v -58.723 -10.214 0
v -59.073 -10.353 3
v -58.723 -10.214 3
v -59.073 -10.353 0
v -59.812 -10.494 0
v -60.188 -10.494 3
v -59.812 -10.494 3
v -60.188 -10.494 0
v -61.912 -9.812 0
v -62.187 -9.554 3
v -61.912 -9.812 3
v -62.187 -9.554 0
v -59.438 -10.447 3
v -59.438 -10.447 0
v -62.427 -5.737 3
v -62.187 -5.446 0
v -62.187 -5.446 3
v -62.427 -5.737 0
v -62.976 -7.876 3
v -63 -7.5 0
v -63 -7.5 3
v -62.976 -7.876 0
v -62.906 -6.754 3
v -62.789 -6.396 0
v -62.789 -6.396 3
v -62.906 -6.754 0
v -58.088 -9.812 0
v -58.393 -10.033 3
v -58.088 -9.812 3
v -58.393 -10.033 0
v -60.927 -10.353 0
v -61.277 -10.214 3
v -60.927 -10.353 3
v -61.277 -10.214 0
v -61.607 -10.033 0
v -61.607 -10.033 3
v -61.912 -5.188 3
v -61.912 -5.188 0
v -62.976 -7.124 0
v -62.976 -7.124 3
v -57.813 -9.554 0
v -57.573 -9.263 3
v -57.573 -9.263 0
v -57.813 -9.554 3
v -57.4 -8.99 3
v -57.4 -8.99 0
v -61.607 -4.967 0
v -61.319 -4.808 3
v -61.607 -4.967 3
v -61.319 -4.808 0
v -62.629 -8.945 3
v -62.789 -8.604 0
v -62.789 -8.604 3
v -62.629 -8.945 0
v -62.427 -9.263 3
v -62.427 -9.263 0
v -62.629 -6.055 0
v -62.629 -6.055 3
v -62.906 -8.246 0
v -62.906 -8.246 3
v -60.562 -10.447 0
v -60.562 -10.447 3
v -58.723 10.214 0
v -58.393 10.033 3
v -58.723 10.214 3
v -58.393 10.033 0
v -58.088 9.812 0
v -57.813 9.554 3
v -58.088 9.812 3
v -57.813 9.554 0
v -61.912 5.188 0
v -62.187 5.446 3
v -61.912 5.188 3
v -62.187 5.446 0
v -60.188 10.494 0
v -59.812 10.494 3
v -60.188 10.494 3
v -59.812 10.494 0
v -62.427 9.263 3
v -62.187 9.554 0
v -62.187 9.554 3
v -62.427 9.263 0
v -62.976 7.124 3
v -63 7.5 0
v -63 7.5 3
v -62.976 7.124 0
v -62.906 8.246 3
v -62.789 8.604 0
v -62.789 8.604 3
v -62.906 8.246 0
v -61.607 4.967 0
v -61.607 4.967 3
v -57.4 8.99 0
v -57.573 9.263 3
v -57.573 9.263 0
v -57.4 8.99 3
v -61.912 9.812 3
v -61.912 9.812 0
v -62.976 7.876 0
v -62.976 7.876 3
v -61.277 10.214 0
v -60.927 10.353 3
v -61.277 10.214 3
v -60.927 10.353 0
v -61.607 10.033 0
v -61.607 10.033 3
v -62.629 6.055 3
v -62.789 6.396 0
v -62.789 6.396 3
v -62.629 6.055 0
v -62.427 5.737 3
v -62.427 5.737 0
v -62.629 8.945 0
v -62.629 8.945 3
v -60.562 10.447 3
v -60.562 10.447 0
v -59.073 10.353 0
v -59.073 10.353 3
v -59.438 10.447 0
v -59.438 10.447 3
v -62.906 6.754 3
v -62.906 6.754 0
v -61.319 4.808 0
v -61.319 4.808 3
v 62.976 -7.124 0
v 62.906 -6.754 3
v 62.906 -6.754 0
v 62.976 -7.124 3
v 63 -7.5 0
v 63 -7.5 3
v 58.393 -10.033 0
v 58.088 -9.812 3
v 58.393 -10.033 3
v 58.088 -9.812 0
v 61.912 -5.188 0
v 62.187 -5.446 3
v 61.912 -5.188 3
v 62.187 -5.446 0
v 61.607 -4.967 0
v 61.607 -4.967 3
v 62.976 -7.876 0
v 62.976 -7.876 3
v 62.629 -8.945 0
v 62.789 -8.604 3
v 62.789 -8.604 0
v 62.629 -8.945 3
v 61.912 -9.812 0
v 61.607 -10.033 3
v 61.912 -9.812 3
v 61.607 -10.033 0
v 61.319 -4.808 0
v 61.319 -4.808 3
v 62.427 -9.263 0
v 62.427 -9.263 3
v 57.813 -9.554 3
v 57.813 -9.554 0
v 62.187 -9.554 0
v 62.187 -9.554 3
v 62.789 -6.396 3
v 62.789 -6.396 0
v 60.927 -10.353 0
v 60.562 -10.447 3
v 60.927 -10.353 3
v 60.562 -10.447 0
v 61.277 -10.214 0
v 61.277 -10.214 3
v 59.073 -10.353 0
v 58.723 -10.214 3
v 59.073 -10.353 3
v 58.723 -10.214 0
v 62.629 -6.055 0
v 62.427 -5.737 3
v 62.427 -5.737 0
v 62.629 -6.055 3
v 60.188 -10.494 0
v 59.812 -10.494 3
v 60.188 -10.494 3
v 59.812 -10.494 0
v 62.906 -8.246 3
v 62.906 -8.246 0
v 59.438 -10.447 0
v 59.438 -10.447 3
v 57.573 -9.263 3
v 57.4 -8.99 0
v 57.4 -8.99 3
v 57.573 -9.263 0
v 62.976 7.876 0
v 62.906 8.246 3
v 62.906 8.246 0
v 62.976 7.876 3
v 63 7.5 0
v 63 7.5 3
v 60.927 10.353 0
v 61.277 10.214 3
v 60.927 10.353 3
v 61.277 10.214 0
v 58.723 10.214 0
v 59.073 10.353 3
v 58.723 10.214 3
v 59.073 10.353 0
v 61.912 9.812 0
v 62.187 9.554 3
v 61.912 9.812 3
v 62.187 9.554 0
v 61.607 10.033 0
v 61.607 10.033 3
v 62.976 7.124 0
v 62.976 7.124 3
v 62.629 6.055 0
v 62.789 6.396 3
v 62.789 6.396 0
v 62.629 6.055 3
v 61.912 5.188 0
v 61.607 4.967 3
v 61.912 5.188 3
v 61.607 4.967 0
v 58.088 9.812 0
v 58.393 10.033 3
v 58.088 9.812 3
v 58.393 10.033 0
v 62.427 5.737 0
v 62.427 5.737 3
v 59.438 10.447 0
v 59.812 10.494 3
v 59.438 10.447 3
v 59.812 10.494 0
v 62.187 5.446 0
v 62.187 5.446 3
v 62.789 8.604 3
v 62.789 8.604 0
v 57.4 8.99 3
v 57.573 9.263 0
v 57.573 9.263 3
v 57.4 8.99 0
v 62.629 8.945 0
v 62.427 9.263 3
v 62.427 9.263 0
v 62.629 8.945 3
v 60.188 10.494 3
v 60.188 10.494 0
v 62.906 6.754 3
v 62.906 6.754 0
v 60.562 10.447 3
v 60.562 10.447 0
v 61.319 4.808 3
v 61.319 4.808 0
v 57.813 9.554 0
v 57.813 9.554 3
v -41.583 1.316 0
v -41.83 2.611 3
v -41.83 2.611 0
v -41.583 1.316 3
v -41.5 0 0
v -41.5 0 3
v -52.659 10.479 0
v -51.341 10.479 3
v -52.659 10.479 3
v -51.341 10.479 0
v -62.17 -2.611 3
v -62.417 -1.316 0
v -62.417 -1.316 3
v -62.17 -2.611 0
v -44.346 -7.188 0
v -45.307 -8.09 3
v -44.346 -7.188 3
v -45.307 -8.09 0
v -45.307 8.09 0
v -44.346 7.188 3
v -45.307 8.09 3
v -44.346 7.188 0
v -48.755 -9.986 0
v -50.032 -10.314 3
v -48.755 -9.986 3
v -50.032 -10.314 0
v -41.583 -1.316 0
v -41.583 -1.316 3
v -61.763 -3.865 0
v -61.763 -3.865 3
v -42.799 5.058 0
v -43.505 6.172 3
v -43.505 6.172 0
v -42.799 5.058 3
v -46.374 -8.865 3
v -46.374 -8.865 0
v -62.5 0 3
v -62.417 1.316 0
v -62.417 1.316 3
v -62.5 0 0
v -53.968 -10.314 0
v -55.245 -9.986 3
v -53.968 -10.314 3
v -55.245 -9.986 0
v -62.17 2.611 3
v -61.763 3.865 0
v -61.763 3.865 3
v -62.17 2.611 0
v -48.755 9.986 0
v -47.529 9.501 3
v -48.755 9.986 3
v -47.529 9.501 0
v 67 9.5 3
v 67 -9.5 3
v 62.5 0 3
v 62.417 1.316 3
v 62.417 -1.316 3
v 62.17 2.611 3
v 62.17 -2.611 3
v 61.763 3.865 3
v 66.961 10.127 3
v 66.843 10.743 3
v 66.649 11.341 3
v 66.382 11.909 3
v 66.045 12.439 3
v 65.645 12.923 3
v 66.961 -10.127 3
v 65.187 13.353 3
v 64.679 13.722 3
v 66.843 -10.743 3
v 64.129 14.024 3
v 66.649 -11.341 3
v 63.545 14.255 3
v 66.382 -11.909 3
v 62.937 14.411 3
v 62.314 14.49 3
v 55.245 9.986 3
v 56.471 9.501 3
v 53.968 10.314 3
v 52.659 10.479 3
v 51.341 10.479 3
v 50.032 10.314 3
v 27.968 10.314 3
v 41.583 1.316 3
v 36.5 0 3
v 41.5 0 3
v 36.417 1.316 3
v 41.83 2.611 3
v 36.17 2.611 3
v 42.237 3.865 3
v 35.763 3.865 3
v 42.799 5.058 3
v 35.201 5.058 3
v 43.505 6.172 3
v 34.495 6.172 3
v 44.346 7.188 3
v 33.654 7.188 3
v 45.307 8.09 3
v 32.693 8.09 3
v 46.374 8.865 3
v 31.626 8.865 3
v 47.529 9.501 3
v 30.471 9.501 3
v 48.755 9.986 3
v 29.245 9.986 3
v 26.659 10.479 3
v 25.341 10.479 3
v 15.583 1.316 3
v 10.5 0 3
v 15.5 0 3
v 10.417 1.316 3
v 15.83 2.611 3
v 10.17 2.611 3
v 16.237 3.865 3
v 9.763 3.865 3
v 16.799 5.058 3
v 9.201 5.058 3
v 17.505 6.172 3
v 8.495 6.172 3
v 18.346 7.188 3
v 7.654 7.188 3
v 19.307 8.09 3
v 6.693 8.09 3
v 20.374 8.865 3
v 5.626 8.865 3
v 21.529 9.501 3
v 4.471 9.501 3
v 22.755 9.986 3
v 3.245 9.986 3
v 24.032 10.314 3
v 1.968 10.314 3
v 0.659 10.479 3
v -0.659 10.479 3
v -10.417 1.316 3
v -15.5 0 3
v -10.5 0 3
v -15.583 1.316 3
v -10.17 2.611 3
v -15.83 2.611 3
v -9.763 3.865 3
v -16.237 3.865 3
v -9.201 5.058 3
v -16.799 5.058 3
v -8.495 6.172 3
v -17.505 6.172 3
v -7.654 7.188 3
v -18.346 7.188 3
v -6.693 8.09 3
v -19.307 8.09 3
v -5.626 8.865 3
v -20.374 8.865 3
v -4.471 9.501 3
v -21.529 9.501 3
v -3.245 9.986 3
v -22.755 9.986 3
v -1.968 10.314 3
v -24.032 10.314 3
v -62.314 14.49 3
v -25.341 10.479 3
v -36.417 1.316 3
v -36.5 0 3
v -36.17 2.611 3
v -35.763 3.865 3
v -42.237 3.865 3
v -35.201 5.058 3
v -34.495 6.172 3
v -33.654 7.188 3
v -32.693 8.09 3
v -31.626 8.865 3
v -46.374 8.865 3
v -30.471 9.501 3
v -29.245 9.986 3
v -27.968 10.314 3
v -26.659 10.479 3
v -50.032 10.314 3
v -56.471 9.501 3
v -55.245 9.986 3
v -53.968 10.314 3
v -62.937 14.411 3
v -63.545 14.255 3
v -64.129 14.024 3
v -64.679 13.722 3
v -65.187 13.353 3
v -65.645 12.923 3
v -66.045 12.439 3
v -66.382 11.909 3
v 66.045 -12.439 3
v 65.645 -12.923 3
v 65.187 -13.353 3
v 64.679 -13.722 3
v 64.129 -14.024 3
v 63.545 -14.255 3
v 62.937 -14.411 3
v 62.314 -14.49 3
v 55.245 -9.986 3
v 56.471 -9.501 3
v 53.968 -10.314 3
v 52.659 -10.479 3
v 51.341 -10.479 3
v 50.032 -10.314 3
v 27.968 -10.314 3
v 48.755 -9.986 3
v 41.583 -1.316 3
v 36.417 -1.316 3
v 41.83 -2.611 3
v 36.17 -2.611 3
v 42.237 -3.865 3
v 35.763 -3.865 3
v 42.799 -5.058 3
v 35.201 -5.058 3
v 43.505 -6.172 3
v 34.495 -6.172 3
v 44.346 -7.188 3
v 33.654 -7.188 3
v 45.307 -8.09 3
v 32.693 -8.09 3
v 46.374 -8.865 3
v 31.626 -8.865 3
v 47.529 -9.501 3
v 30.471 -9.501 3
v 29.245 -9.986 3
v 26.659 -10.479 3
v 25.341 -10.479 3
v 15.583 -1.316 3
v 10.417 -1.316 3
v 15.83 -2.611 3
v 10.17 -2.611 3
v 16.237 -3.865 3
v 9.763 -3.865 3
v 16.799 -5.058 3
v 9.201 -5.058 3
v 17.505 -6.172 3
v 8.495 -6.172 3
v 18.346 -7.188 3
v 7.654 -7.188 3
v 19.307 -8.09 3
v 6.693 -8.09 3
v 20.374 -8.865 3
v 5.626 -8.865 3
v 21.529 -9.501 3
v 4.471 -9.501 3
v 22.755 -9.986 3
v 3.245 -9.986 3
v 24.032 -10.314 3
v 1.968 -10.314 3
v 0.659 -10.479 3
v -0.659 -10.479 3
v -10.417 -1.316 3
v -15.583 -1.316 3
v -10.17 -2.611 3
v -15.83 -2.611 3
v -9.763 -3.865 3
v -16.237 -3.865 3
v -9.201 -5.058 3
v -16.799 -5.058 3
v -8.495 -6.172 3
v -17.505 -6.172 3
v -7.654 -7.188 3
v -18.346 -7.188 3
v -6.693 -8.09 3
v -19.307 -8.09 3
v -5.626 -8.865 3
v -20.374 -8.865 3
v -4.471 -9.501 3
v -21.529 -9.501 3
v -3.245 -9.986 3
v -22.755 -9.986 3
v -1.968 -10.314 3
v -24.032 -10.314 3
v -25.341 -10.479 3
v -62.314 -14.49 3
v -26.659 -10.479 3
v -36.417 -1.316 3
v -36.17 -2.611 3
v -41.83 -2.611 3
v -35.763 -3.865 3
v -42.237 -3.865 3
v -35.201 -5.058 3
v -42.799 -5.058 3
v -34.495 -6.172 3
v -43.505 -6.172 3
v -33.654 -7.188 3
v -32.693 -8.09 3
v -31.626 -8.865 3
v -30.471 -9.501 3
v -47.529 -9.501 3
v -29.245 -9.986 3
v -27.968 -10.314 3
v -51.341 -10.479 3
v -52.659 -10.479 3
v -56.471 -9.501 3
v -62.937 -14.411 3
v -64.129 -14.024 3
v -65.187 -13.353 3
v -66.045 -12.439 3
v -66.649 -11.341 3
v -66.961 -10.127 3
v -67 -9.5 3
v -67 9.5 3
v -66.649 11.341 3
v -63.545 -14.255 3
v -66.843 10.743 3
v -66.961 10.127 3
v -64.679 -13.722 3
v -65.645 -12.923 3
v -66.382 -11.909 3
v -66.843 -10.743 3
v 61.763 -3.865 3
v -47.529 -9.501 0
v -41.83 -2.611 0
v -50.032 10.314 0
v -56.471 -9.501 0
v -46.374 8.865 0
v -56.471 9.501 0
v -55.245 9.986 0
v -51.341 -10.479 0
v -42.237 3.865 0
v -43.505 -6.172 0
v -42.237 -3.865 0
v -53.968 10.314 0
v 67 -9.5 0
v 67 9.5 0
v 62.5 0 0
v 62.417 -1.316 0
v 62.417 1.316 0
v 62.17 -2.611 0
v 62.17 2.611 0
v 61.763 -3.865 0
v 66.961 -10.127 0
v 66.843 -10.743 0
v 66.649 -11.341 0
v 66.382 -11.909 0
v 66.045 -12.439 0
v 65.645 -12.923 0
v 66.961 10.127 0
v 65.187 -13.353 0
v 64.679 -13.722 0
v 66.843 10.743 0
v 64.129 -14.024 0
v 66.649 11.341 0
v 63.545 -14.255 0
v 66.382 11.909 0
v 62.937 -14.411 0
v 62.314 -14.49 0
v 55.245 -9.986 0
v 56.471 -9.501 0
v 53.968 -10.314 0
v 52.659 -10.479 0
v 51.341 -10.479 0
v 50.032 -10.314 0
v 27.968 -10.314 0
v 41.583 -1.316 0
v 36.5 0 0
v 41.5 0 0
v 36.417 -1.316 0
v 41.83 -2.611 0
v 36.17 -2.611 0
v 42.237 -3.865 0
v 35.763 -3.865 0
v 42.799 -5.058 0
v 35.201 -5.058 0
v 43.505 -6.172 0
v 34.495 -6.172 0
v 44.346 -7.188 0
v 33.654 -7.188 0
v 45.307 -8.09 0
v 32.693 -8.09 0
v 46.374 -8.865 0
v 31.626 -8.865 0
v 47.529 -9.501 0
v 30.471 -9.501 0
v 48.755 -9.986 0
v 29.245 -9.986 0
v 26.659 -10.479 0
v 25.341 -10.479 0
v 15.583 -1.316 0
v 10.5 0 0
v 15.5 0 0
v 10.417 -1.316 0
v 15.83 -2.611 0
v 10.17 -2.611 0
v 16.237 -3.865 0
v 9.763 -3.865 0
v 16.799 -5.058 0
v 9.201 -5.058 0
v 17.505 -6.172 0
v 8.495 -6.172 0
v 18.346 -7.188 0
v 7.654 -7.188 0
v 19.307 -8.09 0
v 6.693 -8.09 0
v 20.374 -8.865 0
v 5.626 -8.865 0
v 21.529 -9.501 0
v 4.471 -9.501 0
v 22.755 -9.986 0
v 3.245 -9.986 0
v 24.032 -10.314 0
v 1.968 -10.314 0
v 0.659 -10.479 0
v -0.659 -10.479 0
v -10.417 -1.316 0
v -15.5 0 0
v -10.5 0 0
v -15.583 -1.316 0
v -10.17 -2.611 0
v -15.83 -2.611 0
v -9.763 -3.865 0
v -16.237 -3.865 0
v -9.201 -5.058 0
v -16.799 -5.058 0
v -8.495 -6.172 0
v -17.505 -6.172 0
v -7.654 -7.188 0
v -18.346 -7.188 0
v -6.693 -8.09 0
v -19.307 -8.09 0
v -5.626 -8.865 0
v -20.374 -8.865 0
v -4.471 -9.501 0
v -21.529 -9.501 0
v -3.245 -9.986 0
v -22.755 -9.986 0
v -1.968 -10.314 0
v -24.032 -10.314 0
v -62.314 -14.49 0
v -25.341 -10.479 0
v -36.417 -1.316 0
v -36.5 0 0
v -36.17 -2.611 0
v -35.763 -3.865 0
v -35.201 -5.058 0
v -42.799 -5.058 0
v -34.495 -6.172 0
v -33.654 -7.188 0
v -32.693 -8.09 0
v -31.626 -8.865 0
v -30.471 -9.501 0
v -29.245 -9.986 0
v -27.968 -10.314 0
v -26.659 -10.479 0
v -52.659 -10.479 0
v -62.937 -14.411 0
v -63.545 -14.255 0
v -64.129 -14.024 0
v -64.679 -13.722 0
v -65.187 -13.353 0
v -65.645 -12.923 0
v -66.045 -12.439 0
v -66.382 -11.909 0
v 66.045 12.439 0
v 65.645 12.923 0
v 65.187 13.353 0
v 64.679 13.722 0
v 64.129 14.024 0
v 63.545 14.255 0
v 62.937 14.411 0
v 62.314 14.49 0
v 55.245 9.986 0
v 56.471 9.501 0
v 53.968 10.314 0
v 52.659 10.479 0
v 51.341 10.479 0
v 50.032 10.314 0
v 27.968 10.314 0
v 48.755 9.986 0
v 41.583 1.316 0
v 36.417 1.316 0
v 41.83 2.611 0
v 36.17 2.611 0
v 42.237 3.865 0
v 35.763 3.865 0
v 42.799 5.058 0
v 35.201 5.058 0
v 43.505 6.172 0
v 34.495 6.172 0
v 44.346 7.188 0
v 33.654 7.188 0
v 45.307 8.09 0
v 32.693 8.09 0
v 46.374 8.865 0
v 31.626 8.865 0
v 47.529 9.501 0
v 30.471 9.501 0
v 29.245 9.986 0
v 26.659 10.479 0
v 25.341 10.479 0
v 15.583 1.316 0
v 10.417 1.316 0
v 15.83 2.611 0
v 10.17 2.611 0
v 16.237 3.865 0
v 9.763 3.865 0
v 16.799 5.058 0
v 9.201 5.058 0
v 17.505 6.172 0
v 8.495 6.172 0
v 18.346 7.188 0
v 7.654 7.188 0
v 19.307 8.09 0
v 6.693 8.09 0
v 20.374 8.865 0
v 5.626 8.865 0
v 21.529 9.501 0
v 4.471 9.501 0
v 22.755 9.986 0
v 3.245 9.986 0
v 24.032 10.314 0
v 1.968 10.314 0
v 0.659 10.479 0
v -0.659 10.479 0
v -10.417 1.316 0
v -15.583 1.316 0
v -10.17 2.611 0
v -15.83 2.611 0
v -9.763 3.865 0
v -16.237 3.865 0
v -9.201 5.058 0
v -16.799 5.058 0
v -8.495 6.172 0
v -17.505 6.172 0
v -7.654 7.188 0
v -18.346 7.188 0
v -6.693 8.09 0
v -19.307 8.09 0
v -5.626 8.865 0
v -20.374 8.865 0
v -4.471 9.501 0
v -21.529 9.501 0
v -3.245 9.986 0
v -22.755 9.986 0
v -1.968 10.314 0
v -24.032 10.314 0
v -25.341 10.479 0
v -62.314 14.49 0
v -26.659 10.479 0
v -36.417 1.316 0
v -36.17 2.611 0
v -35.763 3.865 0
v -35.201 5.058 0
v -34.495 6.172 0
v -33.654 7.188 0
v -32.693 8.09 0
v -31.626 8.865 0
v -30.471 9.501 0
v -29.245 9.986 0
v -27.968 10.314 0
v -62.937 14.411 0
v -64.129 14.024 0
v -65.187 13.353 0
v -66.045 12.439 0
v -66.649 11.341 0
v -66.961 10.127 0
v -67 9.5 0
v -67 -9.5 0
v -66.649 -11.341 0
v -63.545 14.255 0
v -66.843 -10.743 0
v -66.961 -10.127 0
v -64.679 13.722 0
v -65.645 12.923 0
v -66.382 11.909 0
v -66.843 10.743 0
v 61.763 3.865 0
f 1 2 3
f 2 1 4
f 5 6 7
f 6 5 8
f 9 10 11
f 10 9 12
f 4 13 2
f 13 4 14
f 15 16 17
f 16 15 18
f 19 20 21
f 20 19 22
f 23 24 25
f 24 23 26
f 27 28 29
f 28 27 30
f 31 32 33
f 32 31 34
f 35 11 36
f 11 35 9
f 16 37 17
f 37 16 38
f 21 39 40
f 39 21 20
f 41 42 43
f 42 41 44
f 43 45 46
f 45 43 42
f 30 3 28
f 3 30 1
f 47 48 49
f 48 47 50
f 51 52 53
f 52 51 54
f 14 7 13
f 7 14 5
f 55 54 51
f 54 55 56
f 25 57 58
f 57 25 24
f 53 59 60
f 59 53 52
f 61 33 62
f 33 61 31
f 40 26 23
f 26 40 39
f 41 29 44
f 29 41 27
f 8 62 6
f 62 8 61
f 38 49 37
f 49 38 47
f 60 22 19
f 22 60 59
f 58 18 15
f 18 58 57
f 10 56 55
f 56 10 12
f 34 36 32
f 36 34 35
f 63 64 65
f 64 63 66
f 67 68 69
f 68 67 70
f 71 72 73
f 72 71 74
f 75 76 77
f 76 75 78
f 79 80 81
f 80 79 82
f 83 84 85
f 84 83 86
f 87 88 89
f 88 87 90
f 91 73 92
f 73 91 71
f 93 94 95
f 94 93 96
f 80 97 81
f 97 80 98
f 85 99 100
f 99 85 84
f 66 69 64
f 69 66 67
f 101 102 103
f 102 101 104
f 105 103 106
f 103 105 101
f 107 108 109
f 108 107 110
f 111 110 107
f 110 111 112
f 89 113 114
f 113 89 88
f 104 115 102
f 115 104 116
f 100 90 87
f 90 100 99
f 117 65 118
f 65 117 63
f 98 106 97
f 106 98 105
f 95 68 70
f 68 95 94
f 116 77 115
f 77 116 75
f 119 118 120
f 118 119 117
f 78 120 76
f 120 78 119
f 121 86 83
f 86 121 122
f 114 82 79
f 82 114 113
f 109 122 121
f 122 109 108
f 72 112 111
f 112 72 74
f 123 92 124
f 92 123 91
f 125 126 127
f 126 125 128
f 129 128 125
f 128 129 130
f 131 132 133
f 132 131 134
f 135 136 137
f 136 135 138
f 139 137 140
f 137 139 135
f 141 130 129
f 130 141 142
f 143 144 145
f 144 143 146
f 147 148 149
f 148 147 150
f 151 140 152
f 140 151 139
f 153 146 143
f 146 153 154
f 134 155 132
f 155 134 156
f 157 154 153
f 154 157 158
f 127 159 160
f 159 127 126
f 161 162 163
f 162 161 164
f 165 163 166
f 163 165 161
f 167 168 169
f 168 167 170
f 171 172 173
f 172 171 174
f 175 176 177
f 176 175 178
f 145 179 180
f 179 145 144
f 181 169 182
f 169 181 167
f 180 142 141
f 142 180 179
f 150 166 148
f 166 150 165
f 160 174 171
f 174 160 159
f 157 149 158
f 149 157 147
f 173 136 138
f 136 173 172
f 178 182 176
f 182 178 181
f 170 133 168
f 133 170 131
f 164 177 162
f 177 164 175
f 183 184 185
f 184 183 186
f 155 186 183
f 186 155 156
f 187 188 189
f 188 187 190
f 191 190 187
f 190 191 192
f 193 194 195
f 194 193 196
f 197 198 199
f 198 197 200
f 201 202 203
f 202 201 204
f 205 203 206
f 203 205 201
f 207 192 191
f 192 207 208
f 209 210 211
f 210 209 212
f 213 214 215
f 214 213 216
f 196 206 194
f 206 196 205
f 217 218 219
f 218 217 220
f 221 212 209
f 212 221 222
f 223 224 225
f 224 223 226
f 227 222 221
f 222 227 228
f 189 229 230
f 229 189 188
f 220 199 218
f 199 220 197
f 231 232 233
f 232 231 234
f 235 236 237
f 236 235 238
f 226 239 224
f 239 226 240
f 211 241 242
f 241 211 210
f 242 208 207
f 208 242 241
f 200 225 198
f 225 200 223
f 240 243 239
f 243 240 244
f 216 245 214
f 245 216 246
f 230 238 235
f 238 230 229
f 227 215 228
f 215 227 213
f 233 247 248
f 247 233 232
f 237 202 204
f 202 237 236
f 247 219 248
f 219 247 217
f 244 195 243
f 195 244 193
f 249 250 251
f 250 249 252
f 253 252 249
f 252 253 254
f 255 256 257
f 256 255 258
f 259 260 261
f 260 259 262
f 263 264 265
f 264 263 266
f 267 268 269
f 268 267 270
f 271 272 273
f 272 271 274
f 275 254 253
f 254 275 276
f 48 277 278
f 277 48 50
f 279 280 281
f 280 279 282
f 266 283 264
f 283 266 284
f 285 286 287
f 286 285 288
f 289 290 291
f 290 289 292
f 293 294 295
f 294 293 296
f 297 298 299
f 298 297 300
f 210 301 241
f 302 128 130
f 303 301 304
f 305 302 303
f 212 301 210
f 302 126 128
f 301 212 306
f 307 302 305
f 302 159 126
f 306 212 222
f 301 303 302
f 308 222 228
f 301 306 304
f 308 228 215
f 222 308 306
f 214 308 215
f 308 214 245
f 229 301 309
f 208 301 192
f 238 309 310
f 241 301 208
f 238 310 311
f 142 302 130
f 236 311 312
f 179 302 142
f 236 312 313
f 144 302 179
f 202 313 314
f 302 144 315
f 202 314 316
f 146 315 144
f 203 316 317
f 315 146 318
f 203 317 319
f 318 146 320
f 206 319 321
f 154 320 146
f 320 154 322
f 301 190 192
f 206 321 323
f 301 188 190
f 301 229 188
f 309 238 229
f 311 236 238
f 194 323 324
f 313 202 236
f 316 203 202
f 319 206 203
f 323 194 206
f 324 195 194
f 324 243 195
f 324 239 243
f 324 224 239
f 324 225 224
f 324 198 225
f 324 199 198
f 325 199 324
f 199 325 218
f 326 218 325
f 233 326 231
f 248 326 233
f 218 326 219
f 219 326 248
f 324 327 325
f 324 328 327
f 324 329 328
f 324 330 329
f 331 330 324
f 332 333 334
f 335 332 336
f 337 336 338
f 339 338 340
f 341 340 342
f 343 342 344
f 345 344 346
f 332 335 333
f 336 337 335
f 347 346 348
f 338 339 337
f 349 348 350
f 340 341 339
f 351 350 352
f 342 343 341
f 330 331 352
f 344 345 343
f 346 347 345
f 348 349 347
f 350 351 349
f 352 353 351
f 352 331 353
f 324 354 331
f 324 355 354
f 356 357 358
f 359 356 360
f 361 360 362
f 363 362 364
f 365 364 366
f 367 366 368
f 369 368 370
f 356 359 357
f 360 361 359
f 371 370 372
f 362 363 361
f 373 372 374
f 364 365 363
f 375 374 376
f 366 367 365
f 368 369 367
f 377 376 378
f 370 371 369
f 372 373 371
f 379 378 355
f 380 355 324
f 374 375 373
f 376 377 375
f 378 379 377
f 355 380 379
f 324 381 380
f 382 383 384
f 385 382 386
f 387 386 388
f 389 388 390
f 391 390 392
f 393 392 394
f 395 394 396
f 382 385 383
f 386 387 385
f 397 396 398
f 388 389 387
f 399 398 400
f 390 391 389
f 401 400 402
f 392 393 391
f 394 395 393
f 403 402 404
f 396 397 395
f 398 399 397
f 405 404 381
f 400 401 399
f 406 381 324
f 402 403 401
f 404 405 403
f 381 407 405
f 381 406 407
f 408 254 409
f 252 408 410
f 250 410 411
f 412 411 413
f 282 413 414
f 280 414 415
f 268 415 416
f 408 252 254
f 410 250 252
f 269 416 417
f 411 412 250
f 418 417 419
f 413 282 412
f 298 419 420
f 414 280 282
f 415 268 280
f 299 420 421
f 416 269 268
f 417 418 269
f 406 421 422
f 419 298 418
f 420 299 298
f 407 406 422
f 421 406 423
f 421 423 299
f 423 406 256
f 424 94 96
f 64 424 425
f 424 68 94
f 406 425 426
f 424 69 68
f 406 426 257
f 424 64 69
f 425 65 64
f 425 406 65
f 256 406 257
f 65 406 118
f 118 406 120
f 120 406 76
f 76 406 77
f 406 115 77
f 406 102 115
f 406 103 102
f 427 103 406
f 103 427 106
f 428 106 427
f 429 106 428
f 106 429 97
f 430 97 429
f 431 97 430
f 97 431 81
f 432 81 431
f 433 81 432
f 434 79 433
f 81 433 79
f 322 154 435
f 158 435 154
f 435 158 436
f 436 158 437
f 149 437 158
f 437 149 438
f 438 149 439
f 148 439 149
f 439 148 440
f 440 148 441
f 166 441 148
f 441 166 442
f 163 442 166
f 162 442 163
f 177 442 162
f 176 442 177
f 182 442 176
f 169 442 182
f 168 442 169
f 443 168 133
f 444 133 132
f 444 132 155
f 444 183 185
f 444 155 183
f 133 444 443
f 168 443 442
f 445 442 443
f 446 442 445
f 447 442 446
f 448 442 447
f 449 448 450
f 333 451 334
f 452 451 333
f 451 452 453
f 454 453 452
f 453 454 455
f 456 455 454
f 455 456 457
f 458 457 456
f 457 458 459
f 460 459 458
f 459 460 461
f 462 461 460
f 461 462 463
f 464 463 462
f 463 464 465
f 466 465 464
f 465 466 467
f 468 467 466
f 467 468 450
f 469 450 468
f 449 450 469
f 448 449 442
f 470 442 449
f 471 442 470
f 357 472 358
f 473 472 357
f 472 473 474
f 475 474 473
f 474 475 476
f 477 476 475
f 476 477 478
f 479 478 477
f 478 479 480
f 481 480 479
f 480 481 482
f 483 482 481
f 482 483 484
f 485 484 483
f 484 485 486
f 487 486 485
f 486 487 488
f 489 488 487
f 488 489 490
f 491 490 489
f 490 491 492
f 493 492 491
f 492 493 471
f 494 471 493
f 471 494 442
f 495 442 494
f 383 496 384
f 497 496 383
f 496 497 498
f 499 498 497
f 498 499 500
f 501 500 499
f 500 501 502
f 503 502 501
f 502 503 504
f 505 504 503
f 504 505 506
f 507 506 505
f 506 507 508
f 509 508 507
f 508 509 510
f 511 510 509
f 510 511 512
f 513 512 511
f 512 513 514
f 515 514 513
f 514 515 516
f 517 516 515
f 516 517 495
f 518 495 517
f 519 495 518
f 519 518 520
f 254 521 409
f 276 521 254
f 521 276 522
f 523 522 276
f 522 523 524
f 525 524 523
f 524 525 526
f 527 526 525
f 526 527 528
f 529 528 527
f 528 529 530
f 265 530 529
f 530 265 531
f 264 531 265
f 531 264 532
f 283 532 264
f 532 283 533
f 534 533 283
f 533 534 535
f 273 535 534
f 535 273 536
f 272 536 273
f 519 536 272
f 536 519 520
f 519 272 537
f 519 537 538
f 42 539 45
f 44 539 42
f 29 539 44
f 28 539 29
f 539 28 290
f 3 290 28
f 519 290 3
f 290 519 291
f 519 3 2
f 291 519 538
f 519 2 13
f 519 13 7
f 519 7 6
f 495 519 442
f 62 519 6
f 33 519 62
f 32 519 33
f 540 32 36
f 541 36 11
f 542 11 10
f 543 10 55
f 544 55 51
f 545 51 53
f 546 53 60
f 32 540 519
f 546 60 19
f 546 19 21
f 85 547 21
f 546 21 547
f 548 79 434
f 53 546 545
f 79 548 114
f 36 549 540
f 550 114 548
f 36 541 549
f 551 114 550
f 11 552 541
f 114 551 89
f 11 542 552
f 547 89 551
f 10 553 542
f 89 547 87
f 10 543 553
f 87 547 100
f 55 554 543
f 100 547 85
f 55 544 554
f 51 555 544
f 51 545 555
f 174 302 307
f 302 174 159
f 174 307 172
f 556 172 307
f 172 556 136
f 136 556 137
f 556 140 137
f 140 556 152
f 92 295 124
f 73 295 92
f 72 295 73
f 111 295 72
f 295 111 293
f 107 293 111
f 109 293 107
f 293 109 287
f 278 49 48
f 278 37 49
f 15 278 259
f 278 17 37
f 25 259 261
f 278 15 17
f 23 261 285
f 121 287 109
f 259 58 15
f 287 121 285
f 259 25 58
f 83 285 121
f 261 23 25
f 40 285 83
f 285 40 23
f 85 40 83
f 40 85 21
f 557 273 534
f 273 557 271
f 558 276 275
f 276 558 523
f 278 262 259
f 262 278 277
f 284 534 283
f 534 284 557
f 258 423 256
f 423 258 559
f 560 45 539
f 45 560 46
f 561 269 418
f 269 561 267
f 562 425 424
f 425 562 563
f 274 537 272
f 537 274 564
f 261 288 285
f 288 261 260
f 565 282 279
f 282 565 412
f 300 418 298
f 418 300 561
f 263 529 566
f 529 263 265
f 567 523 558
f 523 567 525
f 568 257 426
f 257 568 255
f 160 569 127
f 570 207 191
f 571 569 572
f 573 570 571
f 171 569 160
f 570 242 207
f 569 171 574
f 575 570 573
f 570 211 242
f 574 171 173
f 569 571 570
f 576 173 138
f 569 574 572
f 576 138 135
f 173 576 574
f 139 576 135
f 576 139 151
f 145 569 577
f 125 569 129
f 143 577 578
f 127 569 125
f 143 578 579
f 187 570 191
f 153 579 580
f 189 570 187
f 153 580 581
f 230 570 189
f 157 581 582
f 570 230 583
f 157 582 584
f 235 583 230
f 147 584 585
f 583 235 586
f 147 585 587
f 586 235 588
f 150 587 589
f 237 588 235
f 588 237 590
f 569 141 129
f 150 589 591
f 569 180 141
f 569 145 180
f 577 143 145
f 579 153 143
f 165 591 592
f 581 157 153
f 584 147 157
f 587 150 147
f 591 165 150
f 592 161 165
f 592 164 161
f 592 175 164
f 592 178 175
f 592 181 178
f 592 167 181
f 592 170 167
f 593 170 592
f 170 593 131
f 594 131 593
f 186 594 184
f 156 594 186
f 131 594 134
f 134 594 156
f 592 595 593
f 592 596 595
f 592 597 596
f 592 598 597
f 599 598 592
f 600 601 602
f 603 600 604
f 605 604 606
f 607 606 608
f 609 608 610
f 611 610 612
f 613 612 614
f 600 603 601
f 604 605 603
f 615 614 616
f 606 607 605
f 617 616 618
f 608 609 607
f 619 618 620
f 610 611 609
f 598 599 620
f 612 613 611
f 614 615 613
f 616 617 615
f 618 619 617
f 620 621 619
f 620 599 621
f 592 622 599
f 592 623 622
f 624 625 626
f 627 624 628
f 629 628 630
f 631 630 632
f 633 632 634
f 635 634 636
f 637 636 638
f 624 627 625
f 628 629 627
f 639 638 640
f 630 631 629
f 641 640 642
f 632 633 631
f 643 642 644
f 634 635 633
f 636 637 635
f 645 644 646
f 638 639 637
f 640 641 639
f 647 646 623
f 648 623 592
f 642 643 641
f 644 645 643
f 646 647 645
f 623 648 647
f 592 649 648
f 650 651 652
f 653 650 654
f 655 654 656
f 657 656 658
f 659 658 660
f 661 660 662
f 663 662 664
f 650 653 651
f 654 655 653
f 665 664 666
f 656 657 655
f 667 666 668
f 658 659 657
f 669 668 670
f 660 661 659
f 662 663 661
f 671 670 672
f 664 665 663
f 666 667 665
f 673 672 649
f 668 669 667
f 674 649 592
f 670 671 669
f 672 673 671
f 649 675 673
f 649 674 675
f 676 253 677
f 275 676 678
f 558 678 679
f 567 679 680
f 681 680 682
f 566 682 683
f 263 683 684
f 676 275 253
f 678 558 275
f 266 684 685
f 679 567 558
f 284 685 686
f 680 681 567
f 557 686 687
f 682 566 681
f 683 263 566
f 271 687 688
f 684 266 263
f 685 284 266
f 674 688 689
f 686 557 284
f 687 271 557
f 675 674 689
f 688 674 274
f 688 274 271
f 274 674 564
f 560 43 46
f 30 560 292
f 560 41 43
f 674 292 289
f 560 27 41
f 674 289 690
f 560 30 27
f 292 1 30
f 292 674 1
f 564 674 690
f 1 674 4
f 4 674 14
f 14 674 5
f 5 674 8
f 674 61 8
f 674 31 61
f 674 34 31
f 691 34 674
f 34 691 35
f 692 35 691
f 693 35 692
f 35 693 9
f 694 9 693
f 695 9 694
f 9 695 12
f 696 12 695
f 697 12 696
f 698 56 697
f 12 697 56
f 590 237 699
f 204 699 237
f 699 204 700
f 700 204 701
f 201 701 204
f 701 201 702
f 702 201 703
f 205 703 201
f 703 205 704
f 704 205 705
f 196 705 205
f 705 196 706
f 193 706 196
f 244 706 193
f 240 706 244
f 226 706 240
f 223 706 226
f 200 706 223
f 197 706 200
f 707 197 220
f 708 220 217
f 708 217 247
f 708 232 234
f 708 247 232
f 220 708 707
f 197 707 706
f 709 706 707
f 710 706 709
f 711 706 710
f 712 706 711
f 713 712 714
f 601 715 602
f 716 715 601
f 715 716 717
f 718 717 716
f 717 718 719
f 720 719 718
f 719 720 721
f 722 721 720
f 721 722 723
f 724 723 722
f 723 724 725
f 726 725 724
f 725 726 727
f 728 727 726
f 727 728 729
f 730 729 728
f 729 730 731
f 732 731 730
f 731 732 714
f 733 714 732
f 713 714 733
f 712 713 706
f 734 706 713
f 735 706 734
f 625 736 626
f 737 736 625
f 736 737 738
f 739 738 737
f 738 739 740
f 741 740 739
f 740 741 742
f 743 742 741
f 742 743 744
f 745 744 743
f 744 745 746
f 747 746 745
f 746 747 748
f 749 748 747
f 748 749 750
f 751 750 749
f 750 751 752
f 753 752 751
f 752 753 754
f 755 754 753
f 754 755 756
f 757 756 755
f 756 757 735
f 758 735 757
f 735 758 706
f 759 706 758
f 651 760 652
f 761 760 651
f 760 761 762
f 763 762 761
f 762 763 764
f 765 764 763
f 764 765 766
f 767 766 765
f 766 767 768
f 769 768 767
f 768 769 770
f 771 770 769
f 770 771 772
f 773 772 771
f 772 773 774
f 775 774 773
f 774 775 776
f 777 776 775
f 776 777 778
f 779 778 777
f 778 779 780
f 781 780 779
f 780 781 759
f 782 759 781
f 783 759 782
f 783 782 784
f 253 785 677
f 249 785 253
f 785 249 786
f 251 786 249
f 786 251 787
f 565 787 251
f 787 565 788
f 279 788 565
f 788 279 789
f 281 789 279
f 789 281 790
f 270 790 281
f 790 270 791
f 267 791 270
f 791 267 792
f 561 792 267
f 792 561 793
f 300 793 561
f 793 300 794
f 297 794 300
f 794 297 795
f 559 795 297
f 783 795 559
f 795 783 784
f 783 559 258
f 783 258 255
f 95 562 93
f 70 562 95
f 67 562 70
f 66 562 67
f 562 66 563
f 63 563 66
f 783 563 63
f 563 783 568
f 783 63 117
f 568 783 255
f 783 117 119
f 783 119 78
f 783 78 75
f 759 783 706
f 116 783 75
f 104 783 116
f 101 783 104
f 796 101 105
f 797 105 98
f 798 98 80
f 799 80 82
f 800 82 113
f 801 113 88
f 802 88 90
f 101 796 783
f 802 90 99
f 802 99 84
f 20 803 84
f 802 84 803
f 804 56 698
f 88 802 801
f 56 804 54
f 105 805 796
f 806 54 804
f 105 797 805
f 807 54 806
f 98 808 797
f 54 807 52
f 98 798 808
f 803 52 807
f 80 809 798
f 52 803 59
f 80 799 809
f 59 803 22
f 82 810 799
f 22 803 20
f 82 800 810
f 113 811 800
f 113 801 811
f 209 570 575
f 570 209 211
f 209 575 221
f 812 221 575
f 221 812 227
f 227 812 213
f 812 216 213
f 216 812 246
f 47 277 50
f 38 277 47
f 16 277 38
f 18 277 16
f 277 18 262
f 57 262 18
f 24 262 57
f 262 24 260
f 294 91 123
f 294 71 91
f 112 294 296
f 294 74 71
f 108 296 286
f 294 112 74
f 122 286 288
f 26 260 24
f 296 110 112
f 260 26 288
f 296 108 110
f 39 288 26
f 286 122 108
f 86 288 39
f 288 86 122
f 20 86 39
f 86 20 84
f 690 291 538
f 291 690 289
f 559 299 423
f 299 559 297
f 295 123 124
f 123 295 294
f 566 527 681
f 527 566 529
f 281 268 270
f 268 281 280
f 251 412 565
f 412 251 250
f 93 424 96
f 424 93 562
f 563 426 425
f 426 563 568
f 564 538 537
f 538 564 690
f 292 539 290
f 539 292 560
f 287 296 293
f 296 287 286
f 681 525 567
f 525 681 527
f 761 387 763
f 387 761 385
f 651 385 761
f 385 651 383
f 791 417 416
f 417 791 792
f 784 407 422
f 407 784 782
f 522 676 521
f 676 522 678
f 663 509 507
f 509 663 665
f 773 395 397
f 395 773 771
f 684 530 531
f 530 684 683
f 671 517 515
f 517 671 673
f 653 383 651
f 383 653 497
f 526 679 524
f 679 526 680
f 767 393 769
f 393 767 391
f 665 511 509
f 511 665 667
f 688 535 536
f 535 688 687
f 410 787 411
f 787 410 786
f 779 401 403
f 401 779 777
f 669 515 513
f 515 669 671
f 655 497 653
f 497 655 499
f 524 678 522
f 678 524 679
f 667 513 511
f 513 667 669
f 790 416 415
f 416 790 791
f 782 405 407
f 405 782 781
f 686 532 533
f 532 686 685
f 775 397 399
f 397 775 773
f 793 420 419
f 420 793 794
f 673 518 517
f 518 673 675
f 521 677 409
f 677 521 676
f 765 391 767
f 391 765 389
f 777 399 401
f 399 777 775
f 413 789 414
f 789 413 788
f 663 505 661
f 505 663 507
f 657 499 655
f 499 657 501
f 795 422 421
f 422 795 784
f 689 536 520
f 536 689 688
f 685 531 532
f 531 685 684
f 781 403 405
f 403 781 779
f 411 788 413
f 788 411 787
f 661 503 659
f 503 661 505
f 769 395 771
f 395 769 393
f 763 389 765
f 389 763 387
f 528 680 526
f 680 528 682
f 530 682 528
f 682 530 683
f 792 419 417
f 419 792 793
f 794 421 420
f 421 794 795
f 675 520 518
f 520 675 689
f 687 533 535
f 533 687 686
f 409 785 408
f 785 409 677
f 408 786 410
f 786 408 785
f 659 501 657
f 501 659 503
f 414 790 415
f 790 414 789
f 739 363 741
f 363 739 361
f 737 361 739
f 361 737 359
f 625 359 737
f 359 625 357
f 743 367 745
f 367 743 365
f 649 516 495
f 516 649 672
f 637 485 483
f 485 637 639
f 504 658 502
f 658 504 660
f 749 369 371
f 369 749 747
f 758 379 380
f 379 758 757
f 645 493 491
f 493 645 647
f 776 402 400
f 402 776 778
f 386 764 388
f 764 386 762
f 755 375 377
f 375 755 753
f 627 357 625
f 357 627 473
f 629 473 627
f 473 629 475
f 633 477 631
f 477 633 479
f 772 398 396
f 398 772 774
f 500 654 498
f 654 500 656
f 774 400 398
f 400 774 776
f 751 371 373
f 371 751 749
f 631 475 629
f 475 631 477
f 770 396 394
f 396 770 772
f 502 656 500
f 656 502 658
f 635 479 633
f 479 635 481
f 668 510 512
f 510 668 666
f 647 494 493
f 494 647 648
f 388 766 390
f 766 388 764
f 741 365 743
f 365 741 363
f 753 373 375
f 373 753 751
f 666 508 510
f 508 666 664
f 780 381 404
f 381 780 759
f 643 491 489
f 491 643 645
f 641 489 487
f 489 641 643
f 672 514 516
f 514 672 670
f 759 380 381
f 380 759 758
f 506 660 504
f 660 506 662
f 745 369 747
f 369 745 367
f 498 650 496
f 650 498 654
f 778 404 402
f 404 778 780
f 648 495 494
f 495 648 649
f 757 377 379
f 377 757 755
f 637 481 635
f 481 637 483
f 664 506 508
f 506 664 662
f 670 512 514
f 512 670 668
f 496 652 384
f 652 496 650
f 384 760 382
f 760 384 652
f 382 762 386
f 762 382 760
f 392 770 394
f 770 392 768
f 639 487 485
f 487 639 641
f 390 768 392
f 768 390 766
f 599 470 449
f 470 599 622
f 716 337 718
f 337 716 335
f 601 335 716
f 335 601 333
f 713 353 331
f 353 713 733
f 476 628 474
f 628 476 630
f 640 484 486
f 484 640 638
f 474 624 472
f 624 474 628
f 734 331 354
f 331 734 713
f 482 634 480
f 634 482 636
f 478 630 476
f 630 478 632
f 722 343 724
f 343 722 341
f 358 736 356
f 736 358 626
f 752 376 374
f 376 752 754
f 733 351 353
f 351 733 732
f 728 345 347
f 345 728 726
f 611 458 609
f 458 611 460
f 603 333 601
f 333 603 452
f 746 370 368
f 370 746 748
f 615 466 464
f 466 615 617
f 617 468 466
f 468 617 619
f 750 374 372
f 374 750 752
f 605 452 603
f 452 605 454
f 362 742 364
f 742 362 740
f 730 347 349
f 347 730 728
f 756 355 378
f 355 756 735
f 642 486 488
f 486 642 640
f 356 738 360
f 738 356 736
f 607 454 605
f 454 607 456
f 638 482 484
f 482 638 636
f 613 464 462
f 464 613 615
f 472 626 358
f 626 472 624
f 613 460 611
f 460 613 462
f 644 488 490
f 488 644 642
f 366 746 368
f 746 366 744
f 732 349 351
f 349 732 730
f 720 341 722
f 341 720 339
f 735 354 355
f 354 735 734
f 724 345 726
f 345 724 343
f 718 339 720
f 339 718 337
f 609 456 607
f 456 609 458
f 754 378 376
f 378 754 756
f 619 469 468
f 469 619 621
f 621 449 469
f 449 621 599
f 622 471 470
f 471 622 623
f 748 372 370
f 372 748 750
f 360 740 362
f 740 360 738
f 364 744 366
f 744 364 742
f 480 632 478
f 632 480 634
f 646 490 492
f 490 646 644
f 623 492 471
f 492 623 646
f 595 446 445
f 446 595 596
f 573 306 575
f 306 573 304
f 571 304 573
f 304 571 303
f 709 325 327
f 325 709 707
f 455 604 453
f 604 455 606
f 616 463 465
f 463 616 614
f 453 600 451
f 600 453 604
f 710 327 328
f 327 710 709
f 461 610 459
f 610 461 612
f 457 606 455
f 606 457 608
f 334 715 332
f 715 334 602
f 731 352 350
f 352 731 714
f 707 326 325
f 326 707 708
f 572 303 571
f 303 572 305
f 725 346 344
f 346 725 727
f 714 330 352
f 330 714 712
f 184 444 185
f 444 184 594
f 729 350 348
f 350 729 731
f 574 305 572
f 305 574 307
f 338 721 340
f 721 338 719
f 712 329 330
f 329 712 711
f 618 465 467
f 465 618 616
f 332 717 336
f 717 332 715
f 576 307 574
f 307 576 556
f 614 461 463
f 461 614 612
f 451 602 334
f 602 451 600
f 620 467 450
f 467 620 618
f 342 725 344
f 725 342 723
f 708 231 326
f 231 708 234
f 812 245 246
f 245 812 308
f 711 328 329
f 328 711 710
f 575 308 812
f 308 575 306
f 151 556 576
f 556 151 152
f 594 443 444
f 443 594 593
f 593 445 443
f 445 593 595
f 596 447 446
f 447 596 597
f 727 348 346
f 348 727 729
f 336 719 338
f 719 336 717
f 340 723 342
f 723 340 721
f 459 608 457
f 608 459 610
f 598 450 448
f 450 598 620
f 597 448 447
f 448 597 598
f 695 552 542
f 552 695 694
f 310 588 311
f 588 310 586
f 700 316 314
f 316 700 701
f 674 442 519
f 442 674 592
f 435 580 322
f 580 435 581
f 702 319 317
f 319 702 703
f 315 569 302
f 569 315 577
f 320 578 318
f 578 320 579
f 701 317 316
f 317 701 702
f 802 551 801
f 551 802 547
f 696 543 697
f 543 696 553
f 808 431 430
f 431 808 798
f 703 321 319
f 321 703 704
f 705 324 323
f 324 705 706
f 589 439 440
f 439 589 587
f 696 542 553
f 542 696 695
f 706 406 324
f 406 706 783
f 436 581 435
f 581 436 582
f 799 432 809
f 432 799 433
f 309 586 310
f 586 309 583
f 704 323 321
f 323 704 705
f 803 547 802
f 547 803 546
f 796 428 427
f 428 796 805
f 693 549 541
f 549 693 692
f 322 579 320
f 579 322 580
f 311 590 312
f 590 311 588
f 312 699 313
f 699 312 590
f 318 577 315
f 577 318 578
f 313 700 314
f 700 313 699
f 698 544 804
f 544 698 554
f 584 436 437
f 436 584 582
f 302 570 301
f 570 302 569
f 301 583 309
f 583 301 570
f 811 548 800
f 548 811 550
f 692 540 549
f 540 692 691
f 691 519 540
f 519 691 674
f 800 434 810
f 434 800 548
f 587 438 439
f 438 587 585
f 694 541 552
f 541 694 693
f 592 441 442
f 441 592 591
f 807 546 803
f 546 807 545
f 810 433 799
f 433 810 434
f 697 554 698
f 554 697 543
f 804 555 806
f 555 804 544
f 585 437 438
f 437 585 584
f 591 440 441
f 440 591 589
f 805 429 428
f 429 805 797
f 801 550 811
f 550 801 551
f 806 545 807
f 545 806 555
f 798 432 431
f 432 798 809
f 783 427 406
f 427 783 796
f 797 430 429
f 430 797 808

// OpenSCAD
$fn = 50;


difference() {
	union() {
		hull() {
			translate(v = [-62.0000000000, 9.5000000000, 0]) {
				cylinder(h = 3, r = 5);
			}
			translate(v = [62.0000000000, 9.5000000000, 0]) {
				cylinder(h = 3, r = 5);
			}
			translate(v = [-62.0000000000, -9.5000000000, 0]) {
				cylinder(h = 3, r = 5);
			}
			translate(v = [62.0000000000, -9.5000000000, 0]) {
				cylinder(h = 3, r = 5);
			}
		}
	}
	union() {
		#translate(v = [-60.0000000000, -7.5000000000, -100.0000000000]) {
			cylinder(h = 200, r = 3.0000000000);
		}
		#translate(v = [-60.0000000000, 7.5000000000, -100.0000000000]) {
			cylinder(h = 200, r = 3.0000000000);
		}
		#translate(v = [60.0000000000, -7.5000000000, -100.0000000000]) {
			cylinder(h = 200, r = 3.0000000000);
		}
		#translate(v = [60.0000000000, 7.5000000000, -100.0000000000]) {
			cylinder(h = 200, r = 3.0000000000);
		}
		#translate(v = [-52.0000000000, 0, 0]) {
			cylinder(h = 3, r = 10.5000000000);
		}
		#translate(v = [-26.0000000000, 0, 0]) {
			cylinder(h = 3, r = 10.5000000000);
		}
		#cylinder(h = 3, r = 10.5000000000);
		#translate(v = [26.0000000000, 0, 0]) {
			cylinder(h = 3, r = 10.5000000000);
		}
		#translate(v = [52.0000000000, 0, 0]) {
			cylinder(h = 3, r = 10.5000000000);
		}
	}
}
